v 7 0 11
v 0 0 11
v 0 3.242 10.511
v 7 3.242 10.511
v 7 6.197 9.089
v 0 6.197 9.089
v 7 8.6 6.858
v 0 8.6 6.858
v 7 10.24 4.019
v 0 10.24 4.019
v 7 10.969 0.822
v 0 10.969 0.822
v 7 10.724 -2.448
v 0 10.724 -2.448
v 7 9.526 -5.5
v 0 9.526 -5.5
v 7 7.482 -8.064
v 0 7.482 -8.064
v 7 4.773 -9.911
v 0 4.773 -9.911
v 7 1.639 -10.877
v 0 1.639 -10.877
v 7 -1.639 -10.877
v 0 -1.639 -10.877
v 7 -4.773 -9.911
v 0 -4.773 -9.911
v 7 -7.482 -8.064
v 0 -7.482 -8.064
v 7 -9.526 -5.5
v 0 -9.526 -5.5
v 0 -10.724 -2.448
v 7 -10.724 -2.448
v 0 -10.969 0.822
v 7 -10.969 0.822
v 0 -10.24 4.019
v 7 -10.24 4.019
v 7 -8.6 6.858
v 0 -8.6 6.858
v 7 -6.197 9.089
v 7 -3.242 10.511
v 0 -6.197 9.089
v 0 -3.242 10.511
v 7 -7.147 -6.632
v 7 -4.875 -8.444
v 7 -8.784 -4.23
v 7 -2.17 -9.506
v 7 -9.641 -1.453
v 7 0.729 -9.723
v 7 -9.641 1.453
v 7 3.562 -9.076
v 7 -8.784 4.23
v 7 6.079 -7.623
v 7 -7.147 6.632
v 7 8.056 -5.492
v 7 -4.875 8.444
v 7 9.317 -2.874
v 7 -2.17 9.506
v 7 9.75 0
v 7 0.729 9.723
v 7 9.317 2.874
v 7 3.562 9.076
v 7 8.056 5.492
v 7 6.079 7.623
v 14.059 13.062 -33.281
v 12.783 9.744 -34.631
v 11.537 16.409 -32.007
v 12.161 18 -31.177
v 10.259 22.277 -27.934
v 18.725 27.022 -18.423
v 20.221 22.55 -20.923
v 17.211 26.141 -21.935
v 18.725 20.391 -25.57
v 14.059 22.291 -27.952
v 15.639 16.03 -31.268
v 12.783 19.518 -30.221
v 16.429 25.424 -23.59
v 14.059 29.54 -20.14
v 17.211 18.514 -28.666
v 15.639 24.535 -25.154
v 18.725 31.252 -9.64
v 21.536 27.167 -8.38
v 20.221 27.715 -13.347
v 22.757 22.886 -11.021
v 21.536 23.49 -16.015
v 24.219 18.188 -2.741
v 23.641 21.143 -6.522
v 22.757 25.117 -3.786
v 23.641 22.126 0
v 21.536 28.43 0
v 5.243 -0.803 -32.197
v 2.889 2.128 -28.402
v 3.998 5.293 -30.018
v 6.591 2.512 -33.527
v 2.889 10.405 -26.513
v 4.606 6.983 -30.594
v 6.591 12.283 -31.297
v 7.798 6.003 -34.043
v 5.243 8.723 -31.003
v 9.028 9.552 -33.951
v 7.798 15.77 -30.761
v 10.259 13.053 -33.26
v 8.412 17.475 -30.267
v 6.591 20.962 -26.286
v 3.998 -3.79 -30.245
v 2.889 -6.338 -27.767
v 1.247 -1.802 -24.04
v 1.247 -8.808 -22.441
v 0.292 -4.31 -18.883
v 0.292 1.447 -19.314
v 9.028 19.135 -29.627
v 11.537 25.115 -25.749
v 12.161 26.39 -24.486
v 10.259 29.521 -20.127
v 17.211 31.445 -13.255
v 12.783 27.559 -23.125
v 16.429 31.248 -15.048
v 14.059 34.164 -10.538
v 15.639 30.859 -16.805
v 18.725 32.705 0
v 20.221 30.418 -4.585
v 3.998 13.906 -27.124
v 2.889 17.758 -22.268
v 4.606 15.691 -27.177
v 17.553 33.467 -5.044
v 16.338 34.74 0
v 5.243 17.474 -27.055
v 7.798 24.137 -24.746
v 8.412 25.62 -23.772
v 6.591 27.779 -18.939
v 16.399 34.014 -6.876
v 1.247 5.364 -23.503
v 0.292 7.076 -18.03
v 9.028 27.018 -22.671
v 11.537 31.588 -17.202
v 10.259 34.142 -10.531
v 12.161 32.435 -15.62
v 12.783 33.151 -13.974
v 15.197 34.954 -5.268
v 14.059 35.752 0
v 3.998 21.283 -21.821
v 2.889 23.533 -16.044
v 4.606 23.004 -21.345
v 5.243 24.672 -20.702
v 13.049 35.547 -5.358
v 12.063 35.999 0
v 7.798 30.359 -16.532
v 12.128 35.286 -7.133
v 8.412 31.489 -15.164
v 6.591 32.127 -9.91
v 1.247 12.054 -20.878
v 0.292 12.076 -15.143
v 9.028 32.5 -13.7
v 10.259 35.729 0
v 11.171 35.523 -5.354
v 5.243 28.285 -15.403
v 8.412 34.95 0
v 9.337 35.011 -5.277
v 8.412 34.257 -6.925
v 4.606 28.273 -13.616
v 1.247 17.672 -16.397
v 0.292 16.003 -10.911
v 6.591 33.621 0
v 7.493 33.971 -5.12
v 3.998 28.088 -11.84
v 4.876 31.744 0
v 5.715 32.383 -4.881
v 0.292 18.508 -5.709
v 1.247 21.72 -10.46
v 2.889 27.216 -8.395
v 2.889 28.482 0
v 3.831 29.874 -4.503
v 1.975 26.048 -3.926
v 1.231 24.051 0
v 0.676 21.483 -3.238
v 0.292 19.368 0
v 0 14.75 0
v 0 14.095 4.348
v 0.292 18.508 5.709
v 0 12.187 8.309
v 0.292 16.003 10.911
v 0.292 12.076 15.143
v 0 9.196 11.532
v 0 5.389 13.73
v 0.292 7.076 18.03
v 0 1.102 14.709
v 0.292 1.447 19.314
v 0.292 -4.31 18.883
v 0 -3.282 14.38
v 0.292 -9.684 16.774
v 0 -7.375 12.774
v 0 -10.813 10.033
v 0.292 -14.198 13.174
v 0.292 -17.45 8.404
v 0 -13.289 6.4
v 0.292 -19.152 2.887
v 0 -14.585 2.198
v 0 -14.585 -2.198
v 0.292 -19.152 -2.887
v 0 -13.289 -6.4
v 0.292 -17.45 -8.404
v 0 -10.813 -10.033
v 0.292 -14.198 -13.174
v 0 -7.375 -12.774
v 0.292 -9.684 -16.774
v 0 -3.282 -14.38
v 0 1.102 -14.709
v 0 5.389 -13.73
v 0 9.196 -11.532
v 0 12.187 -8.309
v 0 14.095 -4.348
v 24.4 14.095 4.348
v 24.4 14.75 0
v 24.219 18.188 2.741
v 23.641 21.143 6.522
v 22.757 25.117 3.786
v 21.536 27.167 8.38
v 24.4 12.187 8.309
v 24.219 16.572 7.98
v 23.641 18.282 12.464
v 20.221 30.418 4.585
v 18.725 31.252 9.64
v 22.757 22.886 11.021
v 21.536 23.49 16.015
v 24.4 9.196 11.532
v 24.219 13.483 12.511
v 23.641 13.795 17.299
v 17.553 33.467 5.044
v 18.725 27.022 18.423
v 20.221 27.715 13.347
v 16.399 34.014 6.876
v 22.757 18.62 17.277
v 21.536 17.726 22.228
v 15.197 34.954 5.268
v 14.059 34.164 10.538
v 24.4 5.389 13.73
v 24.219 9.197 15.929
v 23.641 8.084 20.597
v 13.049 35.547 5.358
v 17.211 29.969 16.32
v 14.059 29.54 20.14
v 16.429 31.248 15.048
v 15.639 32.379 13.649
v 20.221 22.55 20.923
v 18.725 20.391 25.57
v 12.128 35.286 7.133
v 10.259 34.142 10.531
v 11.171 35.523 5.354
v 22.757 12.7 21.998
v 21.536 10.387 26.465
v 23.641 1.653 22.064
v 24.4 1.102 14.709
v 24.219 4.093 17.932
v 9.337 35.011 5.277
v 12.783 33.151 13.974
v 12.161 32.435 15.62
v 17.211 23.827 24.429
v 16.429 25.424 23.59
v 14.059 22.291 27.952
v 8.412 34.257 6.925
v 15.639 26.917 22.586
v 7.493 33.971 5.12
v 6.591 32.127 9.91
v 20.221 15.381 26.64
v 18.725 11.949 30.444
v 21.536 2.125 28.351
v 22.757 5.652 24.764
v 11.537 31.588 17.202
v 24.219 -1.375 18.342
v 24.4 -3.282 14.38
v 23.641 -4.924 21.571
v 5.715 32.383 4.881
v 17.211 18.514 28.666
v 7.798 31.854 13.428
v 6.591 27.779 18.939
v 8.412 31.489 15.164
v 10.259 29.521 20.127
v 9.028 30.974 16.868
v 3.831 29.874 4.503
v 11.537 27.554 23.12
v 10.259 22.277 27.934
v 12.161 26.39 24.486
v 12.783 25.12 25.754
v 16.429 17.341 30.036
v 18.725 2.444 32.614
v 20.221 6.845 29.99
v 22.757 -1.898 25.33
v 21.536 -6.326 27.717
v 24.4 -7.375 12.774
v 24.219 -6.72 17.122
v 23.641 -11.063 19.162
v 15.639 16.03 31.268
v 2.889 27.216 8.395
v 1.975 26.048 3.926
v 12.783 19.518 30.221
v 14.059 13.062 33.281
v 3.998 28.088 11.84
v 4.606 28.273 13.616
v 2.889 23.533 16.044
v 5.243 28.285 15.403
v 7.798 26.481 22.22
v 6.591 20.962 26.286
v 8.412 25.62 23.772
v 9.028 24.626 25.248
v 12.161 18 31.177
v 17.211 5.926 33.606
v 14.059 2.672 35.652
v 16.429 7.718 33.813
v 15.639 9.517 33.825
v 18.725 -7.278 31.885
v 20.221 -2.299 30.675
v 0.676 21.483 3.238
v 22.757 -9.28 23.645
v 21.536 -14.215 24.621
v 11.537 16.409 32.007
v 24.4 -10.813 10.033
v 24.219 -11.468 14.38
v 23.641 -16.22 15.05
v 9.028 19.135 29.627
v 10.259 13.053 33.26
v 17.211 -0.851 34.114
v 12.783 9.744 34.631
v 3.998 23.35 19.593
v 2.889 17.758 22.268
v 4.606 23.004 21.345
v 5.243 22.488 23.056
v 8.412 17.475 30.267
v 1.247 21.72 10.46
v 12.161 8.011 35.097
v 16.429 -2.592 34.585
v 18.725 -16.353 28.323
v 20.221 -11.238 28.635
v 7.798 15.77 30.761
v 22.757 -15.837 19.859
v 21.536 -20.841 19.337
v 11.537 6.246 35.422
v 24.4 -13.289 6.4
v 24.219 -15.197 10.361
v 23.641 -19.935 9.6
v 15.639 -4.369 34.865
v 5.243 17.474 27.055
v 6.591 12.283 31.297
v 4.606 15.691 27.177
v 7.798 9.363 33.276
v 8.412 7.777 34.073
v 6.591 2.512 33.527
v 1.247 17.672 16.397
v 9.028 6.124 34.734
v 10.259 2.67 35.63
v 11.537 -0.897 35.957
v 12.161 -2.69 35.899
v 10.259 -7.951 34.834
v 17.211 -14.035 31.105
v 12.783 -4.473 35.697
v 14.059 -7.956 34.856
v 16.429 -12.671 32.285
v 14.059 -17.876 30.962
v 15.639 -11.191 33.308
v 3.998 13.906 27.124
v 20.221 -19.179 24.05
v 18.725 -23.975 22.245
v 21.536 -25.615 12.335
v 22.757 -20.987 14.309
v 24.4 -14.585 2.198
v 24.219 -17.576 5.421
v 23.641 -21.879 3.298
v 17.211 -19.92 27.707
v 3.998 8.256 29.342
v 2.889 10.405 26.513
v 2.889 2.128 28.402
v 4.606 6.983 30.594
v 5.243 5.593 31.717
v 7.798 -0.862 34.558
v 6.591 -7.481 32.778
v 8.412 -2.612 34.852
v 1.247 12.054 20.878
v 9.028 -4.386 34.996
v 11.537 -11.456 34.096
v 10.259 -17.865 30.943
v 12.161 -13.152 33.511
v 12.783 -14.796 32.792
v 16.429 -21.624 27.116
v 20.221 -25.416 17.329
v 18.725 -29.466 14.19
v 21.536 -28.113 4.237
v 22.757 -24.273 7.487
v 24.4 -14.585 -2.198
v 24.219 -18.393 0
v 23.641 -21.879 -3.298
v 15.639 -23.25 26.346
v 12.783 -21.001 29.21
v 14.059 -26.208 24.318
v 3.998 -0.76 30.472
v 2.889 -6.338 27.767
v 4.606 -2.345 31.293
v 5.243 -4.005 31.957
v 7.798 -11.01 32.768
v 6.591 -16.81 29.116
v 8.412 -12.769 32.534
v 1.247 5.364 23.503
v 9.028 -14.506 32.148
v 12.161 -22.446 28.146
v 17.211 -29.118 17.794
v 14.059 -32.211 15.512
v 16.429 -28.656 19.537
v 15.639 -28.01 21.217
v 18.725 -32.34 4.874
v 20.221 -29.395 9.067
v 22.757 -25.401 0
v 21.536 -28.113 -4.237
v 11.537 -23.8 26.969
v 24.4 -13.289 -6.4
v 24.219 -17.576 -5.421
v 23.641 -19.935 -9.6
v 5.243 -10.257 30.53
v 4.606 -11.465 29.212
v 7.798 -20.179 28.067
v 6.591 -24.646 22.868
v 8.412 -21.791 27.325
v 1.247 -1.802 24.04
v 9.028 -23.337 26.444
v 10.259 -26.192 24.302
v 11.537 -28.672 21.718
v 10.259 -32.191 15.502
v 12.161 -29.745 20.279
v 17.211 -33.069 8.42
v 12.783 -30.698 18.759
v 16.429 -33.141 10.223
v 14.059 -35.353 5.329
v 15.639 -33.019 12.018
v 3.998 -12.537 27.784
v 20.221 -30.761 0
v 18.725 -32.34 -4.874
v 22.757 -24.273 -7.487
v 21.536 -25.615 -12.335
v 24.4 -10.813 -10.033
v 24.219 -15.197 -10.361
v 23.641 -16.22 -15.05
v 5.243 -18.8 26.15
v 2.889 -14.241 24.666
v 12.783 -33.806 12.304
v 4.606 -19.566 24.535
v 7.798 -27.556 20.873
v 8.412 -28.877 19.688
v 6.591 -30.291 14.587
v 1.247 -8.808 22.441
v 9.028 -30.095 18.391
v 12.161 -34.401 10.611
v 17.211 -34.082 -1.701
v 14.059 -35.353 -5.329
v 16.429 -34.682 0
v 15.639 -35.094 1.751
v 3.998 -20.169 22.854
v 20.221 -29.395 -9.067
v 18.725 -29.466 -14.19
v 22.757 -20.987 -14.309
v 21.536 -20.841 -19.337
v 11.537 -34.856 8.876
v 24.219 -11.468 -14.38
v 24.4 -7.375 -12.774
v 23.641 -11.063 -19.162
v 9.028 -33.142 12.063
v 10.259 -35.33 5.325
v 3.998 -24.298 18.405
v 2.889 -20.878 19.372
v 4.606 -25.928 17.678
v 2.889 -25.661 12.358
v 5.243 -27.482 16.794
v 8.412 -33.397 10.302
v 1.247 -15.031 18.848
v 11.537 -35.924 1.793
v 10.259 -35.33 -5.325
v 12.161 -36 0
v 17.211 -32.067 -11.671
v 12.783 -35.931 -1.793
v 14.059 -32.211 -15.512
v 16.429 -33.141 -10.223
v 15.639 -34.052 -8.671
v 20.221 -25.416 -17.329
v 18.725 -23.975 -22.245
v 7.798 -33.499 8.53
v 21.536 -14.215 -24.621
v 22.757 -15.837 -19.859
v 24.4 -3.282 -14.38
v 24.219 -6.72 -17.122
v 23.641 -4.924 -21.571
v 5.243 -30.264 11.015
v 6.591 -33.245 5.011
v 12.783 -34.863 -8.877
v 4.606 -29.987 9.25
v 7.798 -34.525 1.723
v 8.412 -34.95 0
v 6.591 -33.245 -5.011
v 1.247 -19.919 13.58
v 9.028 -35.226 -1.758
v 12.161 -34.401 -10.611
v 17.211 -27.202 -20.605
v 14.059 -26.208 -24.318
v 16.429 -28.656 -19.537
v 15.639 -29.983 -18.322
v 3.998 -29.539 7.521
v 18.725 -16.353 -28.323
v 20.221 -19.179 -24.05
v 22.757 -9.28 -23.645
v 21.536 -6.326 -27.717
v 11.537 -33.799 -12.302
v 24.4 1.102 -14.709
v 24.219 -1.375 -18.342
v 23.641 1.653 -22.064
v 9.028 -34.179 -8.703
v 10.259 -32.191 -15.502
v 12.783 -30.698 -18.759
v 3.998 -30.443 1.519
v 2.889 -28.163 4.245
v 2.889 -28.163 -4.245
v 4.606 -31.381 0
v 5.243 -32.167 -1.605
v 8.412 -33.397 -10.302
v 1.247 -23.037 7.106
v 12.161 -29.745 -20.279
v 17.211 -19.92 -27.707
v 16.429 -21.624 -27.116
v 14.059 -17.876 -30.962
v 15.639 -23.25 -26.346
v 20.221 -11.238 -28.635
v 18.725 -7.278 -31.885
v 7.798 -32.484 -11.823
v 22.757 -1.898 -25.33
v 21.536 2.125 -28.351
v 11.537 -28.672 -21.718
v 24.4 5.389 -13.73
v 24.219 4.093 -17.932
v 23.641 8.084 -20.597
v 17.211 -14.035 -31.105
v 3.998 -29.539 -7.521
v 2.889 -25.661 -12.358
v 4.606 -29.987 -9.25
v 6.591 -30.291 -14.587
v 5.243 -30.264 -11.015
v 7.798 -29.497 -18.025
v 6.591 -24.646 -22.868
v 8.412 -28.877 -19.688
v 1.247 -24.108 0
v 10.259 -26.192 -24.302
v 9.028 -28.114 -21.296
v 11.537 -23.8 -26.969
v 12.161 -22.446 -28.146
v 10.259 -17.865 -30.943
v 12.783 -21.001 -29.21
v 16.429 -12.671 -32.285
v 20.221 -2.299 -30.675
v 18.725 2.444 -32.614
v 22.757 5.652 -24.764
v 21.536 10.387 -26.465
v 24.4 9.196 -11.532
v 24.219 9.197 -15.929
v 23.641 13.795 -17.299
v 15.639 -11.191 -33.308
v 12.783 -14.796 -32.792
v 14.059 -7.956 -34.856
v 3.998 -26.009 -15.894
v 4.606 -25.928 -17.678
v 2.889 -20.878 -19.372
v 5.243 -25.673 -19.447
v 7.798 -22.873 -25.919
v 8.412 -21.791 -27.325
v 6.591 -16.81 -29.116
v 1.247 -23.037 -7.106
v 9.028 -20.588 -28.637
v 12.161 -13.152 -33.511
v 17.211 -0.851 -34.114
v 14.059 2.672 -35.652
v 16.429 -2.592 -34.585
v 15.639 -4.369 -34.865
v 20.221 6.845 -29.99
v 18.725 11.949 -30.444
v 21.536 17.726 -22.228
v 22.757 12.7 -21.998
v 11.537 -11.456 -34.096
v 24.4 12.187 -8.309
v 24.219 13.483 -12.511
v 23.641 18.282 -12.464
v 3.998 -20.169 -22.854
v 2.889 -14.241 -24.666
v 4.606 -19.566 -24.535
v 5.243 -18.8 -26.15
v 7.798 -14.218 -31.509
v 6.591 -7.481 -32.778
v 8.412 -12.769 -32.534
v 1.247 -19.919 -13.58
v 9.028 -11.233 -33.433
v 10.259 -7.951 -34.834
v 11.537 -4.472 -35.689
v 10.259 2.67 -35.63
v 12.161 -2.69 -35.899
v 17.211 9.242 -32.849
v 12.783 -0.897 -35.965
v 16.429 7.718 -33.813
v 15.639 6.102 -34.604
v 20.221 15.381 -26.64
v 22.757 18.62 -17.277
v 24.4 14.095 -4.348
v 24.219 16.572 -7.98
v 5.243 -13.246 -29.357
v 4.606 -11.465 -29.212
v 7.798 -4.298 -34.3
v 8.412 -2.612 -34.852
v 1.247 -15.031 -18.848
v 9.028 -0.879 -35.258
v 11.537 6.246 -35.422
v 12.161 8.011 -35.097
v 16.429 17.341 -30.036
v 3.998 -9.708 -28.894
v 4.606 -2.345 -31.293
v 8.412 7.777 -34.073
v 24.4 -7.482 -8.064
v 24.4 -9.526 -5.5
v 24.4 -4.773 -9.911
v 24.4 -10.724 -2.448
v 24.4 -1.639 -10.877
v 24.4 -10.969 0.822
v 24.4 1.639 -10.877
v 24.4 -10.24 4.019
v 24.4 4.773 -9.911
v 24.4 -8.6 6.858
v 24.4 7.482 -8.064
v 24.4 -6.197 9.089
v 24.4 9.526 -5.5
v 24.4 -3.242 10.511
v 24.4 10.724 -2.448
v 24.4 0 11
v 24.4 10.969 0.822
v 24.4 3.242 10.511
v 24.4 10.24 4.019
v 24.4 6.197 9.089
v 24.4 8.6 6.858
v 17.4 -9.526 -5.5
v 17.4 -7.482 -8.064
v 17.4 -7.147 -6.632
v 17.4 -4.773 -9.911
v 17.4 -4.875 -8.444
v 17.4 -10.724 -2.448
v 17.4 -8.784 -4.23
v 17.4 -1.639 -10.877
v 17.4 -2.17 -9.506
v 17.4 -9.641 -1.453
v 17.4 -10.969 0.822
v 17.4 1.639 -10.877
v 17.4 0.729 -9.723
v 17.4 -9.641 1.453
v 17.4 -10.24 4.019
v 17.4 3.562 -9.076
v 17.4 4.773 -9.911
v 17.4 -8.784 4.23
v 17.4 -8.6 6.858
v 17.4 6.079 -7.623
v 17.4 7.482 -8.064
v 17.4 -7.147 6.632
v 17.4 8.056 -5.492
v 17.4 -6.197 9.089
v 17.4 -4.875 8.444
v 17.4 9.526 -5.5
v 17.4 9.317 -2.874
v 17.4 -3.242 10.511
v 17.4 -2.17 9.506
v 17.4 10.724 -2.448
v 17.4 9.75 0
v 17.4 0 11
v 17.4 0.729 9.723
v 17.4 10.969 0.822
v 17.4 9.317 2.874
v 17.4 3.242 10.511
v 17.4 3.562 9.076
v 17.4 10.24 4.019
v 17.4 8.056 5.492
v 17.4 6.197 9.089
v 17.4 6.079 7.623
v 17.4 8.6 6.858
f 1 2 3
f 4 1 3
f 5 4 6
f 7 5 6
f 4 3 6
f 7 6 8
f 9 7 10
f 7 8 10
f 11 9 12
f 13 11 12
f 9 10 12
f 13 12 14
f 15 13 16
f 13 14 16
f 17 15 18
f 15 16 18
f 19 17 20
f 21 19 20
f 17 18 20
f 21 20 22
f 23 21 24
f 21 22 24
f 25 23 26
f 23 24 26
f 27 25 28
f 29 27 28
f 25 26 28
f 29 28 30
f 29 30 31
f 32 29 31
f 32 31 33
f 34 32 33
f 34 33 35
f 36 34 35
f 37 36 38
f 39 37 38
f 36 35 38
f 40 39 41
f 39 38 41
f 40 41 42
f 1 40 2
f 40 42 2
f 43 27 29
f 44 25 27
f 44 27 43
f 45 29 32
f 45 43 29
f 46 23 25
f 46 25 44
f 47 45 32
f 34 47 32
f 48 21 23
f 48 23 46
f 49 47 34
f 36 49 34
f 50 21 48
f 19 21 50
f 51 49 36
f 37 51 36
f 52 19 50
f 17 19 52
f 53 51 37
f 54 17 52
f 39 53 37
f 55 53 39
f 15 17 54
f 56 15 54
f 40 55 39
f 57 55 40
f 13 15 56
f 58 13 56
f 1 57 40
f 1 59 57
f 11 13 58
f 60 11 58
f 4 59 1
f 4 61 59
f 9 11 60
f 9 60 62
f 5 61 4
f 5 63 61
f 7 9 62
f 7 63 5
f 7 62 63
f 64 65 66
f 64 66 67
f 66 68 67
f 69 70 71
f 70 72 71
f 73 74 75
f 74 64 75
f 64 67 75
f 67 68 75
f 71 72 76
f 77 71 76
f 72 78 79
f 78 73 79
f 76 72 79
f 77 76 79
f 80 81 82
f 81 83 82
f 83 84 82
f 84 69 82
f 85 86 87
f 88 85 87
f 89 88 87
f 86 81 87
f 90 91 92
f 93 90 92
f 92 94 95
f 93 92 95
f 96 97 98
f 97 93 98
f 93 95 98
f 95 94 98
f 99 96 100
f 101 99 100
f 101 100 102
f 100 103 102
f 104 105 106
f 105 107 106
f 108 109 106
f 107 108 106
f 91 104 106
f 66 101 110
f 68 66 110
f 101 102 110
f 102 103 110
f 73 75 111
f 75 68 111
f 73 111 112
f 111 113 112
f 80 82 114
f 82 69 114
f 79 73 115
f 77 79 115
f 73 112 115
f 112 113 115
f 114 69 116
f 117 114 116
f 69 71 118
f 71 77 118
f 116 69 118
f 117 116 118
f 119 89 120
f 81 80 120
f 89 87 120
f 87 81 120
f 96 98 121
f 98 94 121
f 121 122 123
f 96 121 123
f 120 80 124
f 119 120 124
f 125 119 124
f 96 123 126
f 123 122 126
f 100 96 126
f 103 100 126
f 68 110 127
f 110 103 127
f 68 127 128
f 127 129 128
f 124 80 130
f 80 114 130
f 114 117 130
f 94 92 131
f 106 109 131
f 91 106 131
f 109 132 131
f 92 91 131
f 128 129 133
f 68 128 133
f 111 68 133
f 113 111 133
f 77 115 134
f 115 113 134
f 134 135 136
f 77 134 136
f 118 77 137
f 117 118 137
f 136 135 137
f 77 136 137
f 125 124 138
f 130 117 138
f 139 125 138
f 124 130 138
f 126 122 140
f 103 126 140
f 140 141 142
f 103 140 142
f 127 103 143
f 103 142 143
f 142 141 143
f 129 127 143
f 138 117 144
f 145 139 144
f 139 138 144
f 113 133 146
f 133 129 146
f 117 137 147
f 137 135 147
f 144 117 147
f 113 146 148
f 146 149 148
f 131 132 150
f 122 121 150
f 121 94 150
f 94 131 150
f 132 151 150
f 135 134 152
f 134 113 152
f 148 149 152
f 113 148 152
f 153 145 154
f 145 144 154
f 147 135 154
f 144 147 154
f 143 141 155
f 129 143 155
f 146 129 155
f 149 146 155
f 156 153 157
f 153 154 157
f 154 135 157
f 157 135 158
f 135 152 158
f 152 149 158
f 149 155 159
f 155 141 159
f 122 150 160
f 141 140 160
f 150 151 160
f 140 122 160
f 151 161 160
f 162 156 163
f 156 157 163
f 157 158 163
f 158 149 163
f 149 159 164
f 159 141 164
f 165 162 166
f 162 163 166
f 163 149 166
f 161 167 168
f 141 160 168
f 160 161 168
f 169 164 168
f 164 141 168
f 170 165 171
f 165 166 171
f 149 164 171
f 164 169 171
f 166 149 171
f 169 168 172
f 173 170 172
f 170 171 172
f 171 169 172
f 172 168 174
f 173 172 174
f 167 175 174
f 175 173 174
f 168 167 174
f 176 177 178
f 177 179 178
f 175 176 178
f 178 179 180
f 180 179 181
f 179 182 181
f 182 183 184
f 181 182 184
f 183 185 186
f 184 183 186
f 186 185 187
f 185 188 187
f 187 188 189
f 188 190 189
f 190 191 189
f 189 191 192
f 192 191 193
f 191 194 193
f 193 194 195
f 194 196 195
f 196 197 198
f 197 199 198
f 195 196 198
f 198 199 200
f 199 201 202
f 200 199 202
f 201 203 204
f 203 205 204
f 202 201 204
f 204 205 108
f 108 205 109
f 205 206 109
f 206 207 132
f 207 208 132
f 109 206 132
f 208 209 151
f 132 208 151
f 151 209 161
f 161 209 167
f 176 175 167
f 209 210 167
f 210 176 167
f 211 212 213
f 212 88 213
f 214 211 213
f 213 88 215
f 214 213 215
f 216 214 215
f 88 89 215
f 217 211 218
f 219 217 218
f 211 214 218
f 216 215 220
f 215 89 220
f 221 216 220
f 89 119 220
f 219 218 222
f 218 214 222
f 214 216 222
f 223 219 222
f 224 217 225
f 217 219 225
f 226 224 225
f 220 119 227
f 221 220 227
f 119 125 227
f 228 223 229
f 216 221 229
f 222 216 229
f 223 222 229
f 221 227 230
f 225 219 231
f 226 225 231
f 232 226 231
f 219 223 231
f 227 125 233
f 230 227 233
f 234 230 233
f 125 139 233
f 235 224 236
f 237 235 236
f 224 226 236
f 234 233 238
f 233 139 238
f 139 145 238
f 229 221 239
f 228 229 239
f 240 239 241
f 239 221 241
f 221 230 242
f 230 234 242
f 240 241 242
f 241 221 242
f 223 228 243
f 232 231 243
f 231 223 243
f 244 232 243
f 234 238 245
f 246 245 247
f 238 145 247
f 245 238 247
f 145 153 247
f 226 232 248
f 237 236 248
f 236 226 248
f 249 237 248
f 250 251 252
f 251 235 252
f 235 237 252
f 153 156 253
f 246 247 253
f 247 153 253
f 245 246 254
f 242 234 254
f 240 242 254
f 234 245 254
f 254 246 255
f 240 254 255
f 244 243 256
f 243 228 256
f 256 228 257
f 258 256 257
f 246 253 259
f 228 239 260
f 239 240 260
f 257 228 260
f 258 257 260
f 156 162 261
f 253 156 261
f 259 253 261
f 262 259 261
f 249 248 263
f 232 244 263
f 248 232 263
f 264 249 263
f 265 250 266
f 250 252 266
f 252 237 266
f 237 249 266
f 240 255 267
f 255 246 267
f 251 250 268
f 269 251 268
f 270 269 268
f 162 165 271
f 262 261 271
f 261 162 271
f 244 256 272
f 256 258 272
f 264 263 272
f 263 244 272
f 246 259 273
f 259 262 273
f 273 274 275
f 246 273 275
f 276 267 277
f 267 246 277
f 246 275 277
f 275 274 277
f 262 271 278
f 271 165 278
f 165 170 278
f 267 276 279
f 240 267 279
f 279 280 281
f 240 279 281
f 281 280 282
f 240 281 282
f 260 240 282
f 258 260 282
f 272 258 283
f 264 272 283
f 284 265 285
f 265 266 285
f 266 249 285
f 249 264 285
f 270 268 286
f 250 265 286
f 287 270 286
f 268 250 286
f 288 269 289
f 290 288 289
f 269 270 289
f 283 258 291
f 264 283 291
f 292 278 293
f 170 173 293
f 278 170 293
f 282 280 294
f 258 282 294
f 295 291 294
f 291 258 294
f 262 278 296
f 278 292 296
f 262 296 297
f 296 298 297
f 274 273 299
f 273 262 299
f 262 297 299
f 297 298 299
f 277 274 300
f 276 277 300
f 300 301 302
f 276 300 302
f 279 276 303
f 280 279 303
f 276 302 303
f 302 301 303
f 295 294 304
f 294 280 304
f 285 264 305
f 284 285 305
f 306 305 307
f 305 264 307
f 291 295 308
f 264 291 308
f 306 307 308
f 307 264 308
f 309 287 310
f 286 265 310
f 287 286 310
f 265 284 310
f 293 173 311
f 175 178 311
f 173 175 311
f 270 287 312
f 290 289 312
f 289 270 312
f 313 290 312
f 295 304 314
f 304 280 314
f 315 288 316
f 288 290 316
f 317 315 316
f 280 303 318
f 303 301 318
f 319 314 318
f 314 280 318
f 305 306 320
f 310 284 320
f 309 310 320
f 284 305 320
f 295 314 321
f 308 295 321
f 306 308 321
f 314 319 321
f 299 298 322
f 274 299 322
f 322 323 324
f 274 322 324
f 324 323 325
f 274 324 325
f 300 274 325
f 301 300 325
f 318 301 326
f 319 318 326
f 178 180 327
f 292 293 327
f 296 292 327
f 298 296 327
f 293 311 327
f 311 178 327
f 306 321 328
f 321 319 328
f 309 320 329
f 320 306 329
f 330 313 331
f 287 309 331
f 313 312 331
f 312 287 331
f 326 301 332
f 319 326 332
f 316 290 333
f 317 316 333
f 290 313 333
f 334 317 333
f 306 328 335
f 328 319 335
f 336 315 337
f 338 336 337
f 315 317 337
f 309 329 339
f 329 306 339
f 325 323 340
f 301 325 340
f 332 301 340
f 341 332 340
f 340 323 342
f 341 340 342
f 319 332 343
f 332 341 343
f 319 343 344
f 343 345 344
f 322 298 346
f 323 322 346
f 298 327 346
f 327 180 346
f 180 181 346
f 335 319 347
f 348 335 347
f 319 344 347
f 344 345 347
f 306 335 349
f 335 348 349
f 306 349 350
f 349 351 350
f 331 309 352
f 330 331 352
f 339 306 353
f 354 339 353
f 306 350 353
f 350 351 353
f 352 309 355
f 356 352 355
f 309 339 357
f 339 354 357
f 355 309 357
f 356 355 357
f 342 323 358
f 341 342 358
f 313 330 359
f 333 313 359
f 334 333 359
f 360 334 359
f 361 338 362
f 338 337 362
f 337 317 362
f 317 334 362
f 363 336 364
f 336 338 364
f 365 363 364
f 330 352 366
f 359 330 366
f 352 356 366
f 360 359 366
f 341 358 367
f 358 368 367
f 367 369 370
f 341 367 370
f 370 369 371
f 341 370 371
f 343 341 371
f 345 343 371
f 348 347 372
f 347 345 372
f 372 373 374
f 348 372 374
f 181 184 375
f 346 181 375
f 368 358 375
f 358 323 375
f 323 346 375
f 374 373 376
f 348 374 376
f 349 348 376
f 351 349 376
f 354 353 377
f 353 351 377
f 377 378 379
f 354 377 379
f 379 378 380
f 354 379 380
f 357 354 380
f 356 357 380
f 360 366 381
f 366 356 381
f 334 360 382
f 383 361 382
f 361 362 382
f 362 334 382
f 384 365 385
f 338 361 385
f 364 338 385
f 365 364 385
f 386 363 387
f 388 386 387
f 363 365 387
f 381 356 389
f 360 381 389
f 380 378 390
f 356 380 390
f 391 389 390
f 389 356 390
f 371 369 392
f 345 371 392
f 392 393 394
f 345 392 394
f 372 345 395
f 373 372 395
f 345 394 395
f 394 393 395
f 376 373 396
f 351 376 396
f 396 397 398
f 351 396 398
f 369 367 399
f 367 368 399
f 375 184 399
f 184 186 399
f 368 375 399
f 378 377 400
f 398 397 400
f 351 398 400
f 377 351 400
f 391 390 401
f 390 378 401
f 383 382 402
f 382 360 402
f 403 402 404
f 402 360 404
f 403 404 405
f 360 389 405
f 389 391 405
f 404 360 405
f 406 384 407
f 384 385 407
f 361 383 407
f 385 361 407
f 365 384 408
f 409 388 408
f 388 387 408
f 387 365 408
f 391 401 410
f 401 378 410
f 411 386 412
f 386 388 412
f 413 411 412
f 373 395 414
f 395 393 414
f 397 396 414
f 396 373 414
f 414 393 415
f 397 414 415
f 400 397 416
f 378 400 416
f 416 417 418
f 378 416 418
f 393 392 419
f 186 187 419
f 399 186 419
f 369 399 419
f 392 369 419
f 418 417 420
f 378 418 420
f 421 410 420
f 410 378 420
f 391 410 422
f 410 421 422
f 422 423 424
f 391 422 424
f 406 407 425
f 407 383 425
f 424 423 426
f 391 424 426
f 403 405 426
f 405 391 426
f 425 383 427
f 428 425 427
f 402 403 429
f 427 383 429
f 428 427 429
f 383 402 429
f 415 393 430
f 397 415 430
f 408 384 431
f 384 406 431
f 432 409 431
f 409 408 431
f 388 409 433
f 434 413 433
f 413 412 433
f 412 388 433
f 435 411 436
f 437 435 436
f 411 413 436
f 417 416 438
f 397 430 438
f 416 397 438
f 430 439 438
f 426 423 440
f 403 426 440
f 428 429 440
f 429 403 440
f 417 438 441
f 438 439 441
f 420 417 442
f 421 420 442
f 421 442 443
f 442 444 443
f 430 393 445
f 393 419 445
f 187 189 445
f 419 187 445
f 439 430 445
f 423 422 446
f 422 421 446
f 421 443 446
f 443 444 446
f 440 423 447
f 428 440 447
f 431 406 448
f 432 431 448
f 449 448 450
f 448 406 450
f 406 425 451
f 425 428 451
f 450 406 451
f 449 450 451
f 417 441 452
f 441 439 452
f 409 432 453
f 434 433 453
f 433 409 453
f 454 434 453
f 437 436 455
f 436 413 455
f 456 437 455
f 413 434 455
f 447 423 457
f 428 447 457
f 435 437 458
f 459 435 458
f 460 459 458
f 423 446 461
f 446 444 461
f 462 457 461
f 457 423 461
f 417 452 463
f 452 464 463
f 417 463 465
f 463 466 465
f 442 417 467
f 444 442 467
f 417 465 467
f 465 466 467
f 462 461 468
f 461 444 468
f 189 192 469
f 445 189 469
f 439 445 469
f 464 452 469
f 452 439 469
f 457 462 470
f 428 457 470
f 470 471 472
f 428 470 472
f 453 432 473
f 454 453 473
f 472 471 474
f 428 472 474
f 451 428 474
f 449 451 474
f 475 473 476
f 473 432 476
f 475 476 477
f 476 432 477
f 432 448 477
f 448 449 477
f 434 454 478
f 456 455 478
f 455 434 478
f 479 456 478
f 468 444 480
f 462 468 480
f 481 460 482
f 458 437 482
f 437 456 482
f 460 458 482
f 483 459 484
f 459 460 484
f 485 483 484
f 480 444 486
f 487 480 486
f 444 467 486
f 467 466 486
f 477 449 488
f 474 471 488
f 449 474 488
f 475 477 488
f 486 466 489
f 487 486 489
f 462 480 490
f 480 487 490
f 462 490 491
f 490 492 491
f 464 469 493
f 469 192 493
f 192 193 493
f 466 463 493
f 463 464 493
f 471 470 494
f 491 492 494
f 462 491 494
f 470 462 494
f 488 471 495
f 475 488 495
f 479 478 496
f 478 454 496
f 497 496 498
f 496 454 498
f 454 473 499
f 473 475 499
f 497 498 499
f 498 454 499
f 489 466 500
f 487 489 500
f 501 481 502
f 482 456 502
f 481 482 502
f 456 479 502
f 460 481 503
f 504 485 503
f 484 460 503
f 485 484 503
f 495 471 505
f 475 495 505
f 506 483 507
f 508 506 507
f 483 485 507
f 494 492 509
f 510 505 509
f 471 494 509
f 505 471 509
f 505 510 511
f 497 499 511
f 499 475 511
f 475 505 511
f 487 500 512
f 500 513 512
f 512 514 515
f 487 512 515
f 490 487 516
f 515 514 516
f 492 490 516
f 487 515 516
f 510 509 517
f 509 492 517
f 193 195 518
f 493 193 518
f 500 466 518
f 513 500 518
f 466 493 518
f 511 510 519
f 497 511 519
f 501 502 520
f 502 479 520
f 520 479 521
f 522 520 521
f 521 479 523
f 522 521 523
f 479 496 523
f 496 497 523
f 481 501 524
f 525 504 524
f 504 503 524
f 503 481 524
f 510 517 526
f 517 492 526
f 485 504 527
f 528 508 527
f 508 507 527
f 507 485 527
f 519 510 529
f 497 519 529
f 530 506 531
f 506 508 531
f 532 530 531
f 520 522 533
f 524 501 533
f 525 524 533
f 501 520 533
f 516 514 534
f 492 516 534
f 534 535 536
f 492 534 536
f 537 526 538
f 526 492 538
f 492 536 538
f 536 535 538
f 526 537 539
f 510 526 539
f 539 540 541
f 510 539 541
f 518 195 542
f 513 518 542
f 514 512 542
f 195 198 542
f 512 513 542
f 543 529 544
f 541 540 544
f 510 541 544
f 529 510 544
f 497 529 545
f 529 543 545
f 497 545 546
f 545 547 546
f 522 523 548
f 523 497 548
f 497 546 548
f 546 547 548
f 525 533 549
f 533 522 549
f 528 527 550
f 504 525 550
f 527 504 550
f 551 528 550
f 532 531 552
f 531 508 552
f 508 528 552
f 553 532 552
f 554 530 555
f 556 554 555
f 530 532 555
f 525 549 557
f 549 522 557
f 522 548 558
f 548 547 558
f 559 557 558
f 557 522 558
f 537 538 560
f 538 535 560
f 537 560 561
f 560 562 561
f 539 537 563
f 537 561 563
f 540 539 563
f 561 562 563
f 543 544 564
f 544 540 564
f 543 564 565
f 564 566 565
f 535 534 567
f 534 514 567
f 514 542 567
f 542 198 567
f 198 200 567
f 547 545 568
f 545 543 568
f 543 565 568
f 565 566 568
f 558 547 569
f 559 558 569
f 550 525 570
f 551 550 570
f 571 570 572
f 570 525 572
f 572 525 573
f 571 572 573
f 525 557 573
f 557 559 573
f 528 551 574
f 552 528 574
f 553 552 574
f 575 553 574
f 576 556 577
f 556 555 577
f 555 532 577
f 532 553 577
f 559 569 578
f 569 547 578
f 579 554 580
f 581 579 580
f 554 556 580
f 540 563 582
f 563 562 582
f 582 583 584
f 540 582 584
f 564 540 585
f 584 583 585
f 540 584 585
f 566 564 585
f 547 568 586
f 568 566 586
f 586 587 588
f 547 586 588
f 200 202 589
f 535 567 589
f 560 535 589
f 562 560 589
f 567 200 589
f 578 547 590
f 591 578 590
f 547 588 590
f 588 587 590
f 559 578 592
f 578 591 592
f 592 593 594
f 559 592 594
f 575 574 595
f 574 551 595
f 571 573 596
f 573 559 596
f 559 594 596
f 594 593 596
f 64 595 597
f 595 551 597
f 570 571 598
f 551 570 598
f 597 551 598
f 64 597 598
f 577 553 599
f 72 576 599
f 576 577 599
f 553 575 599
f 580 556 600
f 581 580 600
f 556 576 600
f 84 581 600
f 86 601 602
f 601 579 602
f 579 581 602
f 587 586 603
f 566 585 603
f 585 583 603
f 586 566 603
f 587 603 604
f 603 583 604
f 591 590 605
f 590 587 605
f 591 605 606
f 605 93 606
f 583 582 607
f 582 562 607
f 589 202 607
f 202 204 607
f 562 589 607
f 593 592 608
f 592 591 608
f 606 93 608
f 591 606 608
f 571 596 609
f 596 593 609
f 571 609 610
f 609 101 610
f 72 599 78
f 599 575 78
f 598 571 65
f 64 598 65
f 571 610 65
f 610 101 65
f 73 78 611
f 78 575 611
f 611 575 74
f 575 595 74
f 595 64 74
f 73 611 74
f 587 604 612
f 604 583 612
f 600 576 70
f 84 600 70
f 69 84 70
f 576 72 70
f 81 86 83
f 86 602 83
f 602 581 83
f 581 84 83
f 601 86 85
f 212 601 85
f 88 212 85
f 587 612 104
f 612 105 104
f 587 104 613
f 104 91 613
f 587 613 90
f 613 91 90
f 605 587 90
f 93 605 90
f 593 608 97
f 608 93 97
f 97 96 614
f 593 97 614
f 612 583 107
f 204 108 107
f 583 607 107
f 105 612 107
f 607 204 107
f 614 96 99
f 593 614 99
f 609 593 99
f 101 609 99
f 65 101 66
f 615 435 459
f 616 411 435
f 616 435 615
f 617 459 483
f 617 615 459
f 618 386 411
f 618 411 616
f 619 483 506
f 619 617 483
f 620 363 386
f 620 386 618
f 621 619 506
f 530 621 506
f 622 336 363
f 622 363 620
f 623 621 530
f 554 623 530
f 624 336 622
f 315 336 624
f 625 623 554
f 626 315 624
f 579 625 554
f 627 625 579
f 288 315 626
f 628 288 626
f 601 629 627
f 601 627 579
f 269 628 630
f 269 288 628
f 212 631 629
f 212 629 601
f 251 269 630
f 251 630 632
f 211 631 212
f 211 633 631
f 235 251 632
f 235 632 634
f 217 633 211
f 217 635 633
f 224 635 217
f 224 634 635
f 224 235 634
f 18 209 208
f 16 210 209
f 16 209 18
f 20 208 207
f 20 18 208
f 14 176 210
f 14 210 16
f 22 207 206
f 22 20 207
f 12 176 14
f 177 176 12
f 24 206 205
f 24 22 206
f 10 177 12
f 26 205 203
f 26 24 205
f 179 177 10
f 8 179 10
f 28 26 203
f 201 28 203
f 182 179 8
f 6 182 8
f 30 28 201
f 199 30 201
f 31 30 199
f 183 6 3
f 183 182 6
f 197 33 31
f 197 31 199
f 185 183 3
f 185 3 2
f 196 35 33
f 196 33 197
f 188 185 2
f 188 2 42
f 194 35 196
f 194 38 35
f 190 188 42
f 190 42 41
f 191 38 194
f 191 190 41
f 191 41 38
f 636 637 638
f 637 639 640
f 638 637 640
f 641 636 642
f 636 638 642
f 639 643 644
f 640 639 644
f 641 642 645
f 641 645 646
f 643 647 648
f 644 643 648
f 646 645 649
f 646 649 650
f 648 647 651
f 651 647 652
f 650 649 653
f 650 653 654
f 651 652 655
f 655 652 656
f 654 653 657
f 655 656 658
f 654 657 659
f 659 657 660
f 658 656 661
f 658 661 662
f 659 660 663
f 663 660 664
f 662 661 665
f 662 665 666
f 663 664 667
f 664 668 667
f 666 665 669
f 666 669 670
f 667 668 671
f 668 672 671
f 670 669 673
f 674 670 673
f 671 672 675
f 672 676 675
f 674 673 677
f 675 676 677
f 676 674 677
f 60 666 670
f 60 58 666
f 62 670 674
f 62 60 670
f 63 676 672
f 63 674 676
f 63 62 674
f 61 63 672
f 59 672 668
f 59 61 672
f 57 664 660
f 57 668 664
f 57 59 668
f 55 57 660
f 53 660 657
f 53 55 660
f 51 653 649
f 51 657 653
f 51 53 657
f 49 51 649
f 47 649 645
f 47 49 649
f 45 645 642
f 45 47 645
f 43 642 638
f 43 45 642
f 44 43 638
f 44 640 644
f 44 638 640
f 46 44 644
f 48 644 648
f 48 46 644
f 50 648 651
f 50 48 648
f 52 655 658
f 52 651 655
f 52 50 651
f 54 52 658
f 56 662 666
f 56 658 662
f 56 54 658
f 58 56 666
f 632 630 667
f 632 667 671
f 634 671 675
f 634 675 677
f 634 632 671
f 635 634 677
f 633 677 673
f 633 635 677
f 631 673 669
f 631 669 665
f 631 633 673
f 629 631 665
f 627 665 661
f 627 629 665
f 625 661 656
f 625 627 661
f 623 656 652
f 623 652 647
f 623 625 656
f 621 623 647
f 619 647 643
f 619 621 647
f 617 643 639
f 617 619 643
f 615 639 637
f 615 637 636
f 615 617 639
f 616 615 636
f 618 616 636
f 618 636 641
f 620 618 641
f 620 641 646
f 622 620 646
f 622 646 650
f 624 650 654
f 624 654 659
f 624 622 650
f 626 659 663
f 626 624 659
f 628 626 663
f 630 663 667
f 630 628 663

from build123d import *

# Parameters (mm, degrees)
SKETCH2_R          = 11
CUT_EXTRUDE1_DEPTH = 7


with BuildPart() as part:
    # Sketch1 → Revolve1 (revolve)
    with BuildSketch(Plane.XY):
        with BuildLine():
            Line((0, 9.75), (0, 14.75))
            add(Edge.make_bspline(
                [(24.4, 14.75), (24.4, 36), (12.2, 36), (0, 36), (0, 14.75)],
                knots=[1.570796327, 1.570796327, 1.570796327, 3.141592654, 3.141592654, 4.71238898, 4.71238898, 4.71238898], degree=2, weights=[1, 0.707106781, 1, 0.707106781, 1]))
            Line((24.4, 14.75), (24.4, 9.75))
            Line((24.4, 9.75), (0, 9.75))
        make_face()
    revolve(axis=Axis((0, 0, 0), (1, 0, 0)))

    # Sketch2 → Cut-Extrude1 (cut)
    with BuildSketch(Plane.ZY):
        Circle(SKETCH2_R)
    cut_extrude1 = extrude(amount=-CUT_EXTRUDE1_DEPTH, mode=Mode.SUBTRACT)

    # Mirror1: Cut-Extrude1 across plane
    add(cut_extrude1.mirror(Plane.ZY.offset(-12.2)), mode=Mode.SUBTRACT)


solid = part.part
